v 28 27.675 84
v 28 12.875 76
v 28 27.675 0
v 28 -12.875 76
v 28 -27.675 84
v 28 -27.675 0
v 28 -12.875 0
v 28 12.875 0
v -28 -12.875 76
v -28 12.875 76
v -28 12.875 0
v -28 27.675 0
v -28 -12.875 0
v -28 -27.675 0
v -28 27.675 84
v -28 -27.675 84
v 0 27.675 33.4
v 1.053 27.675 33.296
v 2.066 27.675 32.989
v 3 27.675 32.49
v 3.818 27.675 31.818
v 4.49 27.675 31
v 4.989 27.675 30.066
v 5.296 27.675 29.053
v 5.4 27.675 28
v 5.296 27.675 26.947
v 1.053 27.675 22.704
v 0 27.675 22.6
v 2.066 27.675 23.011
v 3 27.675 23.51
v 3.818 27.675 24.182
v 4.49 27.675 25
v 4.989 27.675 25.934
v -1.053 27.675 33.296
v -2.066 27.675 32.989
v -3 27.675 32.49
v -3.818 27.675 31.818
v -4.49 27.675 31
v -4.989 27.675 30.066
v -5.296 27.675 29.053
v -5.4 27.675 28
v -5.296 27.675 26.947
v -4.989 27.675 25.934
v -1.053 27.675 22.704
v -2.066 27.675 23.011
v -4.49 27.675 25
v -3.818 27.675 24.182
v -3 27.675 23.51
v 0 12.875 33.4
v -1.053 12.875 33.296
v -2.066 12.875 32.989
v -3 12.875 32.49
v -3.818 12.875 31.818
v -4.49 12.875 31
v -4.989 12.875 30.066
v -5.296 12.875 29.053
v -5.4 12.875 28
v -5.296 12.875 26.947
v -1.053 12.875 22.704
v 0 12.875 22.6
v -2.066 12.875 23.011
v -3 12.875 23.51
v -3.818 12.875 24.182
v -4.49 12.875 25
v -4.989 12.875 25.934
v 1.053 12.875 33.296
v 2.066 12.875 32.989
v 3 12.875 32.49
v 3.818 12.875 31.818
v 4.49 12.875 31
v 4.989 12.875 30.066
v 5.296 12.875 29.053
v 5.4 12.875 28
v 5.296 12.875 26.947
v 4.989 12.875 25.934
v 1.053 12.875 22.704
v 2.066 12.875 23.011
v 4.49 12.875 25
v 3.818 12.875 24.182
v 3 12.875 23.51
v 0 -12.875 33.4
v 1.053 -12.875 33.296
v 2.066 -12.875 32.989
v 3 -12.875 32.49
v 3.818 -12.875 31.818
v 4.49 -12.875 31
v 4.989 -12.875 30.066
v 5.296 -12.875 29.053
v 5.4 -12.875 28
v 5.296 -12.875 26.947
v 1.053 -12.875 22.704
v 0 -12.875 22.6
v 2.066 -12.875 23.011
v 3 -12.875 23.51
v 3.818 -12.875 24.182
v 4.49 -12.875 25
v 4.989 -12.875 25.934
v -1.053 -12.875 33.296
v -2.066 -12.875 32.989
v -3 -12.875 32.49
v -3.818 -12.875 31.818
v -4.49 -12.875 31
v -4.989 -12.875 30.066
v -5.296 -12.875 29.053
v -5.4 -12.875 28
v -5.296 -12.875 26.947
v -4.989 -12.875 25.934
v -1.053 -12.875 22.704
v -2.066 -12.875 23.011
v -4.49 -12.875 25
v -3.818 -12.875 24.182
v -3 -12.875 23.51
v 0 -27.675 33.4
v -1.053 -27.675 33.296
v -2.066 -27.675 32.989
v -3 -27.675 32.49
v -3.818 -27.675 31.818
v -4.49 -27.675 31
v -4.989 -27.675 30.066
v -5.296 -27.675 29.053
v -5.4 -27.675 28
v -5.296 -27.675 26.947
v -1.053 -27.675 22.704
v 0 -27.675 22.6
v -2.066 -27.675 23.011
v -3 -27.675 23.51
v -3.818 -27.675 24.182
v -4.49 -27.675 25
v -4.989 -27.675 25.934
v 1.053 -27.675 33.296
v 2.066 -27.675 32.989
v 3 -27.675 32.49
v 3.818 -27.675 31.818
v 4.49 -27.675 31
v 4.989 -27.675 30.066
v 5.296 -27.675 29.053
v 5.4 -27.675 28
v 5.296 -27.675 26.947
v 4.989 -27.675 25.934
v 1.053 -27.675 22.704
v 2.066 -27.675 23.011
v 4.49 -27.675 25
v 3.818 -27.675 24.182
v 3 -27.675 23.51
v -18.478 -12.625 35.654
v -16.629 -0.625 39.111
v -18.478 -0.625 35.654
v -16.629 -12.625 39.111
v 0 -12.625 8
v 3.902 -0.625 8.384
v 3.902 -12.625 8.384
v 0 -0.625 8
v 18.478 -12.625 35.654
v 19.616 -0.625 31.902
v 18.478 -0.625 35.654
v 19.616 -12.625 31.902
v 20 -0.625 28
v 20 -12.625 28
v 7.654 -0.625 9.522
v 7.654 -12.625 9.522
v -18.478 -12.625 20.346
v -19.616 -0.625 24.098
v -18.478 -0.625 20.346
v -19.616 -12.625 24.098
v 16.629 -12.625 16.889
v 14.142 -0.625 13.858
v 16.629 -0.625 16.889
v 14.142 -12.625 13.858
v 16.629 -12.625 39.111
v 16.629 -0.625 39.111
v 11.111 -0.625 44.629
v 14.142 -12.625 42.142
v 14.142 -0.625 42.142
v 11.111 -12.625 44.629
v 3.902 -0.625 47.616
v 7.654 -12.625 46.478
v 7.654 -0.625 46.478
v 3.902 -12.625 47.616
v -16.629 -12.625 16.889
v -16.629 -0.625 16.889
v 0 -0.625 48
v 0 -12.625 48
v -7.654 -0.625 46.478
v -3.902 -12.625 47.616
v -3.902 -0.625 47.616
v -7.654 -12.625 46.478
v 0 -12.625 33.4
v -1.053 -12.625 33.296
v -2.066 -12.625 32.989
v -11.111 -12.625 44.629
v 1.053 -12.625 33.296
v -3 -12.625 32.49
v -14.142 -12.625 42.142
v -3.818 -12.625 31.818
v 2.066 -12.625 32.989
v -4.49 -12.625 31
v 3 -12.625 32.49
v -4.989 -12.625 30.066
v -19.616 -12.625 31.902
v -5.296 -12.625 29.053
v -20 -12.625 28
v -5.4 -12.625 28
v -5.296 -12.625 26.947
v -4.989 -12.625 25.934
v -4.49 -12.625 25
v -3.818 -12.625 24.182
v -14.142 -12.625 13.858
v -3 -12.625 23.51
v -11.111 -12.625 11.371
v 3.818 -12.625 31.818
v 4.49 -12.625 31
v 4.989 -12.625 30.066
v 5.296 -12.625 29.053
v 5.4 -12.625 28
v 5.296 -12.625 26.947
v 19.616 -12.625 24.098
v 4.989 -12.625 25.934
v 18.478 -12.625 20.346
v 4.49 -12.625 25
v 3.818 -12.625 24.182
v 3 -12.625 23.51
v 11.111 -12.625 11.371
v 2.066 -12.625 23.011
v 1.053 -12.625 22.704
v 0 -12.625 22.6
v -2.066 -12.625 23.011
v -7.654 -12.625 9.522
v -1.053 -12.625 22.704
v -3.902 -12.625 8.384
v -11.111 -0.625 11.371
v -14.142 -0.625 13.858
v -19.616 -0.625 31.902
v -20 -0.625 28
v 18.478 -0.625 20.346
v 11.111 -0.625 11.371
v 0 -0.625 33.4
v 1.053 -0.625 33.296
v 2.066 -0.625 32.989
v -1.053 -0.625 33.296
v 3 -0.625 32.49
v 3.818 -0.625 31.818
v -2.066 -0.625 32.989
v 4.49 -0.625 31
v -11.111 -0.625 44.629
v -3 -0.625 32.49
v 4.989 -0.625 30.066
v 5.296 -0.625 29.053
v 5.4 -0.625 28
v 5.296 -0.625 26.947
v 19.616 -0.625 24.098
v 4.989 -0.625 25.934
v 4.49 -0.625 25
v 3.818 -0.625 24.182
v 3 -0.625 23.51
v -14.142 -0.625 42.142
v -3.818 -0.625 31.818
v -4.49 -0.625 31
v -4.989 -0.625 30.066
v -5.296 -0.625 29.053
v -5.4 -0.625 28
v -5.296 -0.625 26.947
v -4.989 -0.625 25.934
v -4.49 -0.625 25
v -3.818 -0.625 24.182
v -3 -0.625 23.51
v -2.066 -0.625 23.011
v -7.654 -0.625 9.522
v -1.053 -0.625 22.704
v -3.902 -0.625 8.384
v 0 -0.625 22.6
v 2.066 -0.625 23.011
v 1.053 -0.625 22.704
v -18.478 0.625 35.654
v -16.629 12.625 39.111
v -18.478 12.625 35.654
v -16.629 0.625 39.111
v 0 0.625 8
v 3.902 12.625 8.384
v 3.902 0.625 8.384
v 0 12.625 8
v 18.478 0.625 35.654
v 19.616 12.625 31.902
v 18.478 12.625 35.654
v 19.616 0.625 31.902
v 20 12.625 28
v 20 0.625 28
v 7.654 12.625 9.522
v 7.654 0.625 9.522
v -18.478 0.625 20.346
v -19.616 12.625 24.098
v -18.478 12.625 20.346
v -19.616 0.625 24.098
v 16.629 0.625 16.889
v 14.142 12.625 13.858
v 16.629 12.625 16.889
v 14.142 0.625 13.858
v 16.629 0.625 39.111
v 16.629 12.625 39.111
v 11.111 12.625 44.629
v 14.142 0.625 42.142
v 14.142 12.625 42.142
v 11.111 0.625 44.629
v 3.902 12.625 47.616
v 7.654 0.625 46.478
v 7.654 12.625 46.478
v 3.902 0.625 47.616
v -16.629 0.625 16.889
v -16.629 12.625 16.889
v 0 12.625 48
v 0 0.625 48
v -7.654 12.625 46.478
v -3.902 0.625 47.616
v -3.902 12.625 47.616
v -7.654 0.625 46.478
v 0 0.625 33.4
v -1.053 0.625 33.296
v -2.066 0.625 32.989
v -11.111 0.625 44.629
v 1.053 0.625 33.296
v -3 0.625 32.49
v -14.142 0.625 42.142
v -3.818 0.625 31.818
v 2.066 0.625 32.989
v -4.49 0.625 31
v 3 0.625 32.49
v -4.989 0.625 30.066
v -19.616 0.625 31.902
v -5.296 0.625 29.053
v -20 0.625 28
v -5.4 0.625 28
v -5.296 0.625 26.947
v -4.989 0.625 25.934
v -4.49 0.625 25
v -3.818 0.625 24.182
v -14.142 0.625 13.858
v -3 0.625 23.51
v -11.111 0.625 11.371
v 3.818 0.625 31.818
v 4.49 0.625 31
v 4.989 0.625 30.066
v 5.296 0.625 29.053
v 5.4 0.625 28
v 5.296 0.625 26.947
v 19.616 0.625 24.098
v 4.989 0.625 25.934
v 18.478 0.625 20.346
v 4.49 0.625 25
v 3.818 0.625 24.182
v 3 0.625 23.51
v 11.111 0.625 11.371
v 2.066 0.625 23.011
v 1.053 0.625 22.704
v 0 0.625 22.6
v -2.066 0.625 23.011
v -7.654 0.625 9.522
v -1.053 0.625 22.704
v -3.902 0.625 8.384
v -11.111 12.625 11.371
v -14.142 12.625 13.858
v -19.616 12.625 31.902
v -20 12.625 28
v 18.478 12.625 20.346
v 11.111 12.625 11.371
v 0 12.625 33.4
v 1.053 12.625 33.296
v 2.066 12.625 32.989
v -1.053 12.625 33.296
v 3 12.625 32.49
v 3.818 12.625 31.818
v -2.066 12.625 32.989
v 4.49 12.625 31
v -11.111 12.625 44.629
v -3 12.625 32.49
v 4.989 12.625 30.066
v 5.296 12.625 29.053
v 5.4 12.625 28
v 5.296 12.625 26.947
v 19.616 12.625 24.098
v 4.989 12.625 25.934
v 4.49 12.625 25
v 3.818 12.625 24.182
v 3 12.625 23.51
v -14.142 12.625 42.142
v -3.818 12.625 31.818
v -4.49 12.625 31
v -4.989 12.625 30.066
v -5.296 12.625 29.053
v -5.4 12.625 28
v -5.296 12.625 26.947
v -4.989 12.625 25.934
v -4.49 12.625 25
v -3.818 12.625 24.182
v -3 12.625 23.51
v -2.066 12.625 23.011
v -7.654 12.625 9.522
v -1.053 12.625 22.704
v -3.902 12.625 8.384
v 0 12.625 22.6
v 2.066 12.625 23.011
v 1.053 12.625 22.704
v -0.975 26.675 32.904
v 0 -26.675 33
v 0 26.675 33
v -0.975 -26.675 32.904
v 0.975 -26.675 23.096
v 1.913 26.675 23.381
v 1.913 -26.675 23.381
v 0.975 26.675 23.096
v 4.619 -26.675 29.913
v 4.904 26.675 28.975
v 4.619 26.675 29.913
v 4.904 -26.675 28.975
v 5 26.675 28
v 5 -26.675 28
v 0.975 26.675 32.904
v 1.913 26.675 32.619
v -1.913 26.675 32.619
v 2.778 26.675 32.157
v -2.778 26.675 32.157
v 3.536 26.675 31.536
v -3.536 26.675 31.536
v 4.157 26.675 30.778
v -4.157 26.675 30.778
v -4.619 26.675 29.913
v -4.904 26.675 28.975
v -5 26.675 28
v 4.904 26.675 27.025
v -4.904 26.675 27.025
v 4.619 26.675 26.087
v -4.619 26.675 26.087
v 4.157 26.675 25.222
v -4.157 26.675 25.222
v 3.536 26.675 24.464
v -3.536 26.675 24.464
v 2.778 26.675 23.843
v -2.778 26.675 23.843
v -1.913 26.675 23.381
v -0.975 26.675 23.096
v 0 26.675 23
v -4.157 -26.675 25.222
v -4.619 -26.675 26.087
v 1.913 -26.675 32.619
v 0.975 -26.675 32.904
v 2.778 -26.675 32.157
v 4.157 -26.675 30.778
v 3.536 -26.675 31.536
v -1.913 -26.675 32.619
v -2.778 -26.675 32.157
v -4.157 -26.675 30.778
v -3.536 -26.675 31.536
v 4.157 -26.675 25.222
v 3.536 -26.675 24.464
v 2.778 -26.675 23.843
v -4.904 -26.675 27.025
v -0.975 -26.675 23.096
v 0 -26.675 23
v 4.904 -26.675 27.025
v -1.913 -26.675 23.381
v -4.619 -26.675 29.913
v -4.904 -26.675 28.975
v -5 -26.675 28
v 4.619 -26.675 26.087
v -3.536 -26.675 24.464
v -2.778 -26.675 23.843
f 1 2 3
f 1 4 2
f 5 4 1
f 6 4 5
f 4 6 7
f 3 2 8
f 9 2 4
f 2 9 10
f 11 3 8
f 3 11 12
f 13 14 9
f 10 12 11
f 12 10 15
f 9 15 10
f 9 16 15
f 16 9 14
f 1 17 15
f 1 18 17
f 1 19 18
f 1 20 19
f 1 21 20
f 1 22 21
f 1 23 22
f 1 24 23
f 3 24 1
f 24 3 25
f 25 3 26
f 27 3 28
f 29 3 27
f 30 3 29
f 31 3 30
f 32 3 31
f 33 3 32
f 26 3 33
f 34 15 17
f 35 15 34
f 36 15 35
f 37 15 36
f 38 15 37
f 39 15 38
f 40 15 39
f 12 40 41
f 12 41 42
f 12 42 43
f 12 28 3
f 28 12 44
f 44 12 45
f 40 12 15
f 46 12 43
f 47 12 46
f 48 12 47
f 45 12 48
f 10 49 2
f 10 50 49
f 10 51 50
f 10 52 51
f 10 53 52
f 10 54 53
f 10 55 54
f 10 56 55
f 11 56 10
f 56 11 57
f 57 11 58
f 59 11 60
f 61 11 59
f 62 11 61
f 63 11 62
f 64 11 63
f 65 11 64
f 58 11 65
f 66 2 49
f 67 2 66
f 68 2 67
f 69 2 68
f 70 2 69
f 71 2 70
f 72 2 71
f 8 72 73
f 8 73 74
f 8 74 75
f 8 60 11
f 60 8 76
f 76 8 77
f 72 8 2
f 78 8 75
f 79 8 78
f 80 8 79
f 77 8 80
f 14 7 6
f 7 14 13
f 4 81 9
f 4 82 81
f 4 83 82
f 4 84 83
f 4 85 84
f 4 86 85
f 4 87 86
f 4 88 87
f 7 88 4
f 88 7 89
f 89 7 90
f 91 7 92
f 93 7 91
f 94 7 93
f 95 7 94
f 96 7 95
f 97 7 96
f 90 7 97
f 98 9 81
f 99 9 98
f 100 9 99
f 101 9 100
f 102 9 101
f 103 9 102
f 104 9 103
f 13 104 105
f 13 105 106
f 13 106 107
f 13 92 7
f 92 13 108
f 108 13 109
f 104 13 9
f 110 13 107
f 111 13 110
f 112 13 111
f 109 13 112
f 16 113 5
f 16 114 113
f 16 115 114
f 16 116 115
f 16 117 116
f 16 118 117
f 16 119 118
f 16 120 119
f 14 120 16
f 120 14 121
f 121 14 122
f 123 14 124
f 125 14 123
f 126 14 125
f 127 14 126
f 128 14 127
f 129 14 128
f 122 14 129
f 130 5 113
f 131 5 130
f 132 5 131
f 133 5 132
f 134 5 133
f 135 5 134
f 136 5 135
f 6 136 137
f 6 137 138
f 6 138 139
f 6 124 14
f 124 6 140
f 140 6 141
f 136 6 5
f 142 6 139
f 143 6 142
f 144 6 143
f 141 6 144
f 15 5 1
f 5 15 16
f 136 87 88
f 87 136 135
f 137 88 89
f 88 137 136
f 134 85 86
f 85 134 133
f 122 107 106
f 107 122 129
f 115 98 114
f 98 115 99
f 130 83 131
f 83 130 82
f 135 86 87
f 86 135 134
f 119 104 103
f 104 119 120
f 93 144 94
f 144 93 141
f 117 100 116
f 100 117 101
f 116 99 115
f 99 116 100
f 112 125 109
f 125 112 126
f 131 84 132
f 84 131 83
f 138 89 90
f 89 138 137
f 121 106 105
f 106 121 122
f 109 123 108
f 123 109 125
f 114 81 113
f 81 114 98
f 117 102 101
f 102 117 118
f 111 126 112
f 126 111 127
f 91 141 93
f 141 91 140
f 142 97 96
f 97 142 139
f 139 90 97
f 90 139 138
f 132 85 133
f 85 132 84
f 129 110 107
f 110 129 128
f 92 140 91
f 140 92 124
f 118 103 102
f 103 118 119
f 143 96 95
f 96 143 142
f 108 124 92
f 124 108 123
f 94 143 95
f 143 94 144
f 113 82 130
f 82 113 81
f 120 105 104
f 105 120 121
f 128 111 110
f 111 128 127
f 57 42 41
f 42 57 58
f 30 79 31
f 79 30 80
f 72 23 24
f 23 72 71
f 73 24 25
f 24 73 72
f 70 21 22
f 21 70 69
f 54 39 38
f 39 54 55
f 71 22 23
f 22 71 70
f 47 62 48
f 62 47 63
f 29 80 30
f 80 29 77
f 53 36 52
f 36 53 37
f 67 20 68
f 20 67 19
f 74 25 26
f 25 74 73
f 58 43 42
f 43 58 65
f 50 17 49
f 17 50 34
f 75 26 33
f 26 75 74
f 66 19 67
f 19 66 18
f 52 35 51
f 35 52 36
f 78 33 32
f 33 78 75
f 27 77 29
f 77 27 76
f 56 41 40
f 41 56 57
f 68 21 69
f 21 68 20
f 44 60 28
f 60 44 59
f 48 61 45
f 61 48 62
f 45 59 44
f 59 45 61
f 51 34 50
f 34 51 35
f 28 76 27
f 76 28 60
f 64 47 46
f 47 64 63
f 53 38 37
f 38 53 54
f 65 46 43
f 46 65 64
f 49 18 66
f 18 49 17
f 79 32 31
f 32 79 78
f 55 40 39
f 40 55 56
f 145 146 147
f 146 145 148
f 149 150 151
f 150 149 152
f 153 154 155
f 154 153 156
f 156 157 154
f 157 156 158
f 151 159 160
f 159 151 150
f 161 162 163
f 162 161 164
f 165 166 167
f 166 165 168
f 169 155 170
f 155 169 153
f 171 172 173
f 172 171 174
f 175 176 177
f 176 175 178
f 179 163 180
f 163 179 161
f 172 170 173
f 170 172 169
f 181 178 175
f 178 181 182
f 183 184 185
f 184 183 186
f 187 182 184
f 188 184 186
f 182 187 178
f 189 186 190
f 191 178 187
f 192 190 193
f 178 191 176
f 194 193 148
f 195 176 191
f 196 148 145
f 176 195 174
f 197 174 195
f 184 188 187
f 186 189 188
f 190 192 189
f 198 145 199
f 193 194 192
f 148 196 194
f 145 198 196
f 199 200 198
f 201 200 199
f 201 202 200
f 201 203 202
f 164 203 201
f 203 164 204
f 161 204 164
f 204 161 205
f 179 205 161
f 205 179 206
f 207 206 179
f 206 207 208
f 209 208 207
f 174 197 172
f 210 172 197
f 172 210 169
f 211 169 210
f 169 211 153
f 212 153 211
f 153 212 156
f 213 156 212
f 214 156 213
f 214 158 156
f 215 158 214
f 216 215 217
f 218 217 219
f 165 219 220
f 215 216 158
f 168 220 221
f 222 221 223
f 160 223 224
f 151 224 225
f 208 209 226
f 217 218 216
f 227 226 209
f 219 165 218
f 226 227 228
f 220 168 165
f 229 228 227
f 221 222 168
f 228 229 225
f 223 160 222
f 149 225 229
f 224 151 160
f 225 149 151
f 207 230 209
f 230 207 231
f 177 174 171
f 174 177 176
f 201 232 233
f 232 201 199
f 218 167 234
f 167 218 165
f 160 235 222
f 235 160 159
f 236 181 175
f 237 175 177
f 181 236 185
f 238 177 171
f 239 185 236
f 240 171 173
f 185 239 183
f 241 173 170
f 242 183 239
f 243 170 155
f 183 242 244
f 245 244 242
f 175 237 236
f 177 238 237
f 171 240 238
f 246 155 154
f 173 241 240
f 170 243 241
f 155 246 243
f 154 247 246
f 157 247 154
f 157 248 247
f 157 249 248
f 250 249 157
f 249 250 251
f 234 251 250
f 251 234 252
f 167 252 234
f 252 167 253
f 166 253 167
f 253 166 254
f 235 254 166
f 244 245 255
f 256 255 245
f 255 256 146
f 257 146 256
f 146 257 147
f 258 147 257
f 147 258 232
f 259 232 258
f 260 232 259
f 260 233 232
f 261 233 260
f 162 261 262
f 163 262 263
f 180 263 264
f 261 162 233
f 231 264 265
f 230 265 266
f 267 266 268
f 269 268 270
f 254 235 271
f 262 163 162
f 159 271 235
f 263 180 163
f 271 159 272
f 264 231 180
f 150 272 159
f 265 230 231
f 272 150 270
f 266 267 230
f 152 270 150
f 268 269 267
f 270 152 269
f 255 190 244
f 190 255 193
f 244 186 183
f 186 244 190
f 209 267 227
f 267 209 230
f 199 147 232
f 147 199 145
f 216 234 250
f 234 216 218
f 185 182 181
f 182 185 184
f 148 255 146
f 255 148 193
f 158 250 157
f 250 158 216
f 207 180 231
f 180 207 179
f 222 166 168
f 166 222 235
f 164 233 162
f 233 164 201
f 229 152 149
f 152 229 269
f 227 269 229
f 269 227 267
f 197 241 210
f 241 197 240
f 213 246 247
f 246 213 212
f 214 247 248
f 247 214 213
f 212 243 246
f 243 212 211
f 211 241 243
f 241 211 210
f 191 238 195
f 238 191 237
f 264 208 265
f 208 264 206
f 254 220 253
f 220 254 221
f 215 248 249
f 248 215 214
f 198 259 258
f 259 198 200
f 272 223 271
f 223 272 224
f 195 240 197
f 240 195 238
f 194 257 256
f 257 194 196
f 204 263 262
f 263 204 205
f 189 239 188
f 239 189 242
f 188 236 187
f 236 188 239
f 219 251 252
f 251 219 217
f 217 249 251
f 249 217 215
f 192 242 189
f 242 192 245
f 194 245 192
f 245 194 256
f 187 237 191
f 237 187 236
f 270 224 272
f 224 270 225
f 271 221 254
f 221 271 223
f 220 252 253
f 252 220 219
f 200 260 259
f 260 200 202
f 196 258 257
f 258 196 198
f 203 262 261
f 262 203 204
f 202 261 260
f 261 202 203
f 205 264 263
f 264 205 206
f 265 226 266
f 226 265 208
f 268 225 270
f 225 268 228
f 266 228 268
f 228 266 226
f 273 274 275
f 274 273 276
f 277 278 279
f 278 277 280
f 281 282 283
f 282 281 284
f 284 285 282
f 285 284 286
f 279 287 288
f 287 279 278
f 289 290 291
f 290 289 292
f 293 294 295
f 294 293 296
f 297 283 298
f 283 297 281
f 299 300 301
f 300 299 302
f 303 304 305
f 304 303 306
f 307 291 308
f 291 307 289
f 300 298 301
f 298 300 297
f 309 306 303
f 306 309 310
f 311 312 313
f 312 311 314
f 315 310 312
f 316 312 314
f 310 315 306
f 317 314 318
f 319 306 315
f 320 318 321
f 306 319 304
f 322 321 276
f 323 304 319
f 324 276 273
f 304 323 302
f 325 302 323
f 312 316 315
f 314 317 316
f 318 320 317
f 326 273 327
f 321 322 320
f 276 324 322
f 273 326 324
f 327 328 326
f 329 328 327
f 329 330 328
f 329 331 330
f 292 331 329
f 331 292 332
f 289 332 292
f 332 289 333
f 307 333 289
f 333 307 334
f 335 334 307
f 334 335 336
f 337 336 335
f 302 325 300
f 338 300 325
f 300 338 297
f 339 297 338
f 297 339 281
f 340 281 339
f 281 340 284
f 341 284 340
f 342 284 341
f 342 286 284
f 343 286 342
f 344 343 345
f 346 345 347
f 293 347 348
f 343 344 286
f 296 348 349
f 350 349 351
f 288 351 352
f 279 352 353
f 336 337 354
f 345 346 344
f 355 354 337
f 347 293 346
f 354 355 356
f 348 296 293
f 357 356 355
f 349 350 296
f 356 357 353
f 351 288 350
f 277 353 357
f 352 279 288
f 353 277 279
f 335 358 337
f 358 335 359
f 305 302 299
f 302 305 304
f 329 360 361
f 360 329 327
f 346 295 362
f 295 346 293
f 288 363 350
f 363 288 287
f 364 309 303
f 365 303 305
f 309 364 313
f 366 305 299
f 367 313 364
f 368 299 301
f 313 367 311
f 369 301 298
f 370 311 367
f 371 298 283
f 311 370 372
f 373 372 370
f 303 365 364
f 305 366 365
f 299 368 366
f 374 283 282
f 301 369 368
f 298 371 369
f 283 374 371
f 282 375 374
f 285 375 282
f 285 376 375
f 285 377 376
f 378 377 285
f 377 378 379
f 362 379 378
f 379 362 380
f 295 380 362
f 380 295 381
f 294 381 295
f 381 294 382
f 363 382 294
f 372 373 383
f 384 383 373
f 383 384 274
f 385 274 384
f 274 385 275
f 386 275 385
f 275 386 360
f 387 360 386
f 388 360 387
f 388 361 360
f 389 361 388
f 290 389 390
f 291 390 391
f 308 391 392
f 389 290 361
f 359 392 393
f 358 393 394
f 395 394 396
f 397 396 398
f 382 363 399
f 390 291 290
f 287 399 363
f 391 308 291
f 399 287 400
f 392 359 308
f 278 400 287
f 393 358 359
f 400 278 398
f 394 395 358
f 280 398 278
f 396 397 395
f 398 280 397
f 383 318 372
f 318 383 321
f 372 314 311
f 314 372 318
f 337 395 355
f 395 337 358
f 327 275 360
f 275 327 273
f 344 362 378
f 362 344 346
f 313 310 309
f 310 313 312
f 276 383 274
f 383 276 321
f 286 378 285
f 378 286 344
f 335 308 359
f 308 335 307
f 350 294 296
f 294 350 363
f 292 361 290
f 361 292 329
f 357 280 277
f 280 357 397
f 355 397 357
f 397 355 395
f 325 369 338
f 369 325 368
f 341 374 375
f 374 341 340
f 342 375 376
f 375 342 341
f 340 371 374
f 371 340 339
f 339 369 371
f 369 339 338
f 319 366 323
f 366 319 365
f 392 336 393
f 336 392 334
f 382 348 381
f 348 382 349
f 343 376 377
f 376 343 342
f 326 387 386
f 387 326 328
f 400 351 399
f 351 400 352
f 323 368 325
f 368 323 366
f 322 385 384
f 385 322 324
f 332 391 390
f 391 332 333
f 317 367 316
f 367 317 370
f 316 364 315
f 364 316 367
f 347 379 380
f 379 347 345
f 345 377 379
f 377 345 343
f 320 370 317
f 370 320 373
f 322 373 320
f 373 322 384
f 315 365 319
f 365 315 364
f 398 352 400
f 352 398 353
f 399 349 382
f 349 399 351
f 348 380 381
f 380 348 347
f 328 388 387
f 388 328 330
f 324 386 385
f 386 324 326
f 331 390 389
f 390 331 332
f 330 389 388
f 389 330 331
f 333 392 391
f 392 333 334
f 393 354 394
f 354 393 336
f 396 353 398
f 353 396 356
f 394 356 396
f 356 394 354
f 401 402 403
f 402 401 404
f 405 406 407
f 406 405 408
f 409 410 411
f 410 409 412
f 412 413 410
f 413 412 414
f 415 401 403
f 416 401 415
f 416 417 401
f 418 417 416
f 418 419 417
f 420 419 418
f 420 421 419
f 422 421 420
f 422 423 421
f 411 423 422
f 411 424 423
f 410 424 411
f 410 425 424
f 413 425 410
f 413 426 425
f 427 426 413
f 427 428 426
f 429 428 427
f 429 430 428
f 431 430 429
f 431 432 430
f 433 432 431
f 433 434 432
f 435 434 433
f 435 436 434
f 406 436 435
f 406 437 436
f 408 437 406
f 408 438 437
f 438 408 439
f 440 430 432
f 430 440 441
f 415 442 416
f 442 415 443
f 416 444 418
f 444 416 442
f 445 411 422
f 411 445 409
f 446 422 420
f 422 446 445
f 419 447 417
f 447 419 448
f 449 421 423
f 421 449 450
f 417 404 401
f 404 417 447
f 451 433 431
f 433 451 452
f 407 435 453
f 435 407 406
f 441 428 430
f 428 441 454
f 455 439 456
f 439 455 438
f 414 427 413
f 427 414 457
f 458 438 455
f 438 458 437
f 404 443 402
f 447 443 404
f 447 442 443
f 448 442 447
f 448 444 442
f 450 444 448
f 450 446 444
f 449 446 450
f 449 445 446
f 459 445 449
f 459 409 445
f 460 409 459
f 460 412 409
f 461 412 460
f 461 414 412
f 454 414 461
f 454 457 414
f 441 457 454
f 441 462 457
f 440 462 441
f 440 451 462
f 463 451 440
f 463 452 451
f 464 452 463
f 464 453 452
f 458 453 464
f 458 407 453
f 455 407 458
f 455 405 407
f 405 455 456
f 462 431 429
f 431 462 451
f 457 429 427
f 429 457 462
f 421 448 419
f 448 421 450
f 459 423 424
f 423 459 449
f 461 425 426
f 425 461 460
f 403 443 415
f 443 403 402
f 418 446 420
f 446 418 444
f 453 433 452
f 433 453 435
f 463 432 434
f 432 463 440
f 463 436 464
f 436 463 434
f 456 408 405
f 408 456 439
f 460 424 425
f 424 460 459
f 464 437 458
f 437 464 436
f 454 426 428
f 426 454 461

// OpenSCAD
$fn = 32;

// ------------------------------------------------------------------------
// Trolley wheel set: wheels d40, fork 76 mm tall
// Every part is its own module, assembly() places every instance.
// ------------------------------------------------------------------------

// --- part 1 ---
module trolley_fork() {
  difference() {
    union() {
      translate([-28, 12.875, 0]) cube([56, 14.8, 76]);
      translate([-28, -27.675, 0]) cube([56, 14.8, 76]);
      translate([-28, -27.675, 76]) cube([56, 55.35, 8]);
    }
    translate([0, -20.275, 28]) rotate([90, 0, 0]) cylinder(h = 16.8, d = 10.8, center = true);
    translate([0, 20.275, 28]) rotate([90, 0, 0]) cylinder(h = 16.8, d = 10.8, center = true);
  }
}

// --- part 2 ---
module trolley_wheel() {
  difference() {
      translate([0, 0, 0]) cylinder(h = 12, d = 40);
      translate([0, 0, -1]) cylinder(h = 14, d = 10.8);
    }
}

// --- part 3 ---
module trolley_axle() {
  translate([0, 0, -26.675]) cylinder(h = 53.35, d = 10);
}

// --- assembly ---
module assembly() {
  color([0.80, 0.24, 0.20]) translate([0, 0, 0]) rotate([0, 0, 0]) trolley_fork();
  color([0.20, 0.45, 0.75]) translate([0, -0.625, 28]) rotate([90, 0, 0]) trolley_wheel();
  color([0.25, 0.62, 0.32]) translate([0, 12.625, 28]) rotate([90, 0, 0]) trolley_wheel();
  color([0.92, 0.70, 0.18]) translate([0, 0, 28]) rotate([90, 0, 0]) trolley_axle();
}

assembly();
